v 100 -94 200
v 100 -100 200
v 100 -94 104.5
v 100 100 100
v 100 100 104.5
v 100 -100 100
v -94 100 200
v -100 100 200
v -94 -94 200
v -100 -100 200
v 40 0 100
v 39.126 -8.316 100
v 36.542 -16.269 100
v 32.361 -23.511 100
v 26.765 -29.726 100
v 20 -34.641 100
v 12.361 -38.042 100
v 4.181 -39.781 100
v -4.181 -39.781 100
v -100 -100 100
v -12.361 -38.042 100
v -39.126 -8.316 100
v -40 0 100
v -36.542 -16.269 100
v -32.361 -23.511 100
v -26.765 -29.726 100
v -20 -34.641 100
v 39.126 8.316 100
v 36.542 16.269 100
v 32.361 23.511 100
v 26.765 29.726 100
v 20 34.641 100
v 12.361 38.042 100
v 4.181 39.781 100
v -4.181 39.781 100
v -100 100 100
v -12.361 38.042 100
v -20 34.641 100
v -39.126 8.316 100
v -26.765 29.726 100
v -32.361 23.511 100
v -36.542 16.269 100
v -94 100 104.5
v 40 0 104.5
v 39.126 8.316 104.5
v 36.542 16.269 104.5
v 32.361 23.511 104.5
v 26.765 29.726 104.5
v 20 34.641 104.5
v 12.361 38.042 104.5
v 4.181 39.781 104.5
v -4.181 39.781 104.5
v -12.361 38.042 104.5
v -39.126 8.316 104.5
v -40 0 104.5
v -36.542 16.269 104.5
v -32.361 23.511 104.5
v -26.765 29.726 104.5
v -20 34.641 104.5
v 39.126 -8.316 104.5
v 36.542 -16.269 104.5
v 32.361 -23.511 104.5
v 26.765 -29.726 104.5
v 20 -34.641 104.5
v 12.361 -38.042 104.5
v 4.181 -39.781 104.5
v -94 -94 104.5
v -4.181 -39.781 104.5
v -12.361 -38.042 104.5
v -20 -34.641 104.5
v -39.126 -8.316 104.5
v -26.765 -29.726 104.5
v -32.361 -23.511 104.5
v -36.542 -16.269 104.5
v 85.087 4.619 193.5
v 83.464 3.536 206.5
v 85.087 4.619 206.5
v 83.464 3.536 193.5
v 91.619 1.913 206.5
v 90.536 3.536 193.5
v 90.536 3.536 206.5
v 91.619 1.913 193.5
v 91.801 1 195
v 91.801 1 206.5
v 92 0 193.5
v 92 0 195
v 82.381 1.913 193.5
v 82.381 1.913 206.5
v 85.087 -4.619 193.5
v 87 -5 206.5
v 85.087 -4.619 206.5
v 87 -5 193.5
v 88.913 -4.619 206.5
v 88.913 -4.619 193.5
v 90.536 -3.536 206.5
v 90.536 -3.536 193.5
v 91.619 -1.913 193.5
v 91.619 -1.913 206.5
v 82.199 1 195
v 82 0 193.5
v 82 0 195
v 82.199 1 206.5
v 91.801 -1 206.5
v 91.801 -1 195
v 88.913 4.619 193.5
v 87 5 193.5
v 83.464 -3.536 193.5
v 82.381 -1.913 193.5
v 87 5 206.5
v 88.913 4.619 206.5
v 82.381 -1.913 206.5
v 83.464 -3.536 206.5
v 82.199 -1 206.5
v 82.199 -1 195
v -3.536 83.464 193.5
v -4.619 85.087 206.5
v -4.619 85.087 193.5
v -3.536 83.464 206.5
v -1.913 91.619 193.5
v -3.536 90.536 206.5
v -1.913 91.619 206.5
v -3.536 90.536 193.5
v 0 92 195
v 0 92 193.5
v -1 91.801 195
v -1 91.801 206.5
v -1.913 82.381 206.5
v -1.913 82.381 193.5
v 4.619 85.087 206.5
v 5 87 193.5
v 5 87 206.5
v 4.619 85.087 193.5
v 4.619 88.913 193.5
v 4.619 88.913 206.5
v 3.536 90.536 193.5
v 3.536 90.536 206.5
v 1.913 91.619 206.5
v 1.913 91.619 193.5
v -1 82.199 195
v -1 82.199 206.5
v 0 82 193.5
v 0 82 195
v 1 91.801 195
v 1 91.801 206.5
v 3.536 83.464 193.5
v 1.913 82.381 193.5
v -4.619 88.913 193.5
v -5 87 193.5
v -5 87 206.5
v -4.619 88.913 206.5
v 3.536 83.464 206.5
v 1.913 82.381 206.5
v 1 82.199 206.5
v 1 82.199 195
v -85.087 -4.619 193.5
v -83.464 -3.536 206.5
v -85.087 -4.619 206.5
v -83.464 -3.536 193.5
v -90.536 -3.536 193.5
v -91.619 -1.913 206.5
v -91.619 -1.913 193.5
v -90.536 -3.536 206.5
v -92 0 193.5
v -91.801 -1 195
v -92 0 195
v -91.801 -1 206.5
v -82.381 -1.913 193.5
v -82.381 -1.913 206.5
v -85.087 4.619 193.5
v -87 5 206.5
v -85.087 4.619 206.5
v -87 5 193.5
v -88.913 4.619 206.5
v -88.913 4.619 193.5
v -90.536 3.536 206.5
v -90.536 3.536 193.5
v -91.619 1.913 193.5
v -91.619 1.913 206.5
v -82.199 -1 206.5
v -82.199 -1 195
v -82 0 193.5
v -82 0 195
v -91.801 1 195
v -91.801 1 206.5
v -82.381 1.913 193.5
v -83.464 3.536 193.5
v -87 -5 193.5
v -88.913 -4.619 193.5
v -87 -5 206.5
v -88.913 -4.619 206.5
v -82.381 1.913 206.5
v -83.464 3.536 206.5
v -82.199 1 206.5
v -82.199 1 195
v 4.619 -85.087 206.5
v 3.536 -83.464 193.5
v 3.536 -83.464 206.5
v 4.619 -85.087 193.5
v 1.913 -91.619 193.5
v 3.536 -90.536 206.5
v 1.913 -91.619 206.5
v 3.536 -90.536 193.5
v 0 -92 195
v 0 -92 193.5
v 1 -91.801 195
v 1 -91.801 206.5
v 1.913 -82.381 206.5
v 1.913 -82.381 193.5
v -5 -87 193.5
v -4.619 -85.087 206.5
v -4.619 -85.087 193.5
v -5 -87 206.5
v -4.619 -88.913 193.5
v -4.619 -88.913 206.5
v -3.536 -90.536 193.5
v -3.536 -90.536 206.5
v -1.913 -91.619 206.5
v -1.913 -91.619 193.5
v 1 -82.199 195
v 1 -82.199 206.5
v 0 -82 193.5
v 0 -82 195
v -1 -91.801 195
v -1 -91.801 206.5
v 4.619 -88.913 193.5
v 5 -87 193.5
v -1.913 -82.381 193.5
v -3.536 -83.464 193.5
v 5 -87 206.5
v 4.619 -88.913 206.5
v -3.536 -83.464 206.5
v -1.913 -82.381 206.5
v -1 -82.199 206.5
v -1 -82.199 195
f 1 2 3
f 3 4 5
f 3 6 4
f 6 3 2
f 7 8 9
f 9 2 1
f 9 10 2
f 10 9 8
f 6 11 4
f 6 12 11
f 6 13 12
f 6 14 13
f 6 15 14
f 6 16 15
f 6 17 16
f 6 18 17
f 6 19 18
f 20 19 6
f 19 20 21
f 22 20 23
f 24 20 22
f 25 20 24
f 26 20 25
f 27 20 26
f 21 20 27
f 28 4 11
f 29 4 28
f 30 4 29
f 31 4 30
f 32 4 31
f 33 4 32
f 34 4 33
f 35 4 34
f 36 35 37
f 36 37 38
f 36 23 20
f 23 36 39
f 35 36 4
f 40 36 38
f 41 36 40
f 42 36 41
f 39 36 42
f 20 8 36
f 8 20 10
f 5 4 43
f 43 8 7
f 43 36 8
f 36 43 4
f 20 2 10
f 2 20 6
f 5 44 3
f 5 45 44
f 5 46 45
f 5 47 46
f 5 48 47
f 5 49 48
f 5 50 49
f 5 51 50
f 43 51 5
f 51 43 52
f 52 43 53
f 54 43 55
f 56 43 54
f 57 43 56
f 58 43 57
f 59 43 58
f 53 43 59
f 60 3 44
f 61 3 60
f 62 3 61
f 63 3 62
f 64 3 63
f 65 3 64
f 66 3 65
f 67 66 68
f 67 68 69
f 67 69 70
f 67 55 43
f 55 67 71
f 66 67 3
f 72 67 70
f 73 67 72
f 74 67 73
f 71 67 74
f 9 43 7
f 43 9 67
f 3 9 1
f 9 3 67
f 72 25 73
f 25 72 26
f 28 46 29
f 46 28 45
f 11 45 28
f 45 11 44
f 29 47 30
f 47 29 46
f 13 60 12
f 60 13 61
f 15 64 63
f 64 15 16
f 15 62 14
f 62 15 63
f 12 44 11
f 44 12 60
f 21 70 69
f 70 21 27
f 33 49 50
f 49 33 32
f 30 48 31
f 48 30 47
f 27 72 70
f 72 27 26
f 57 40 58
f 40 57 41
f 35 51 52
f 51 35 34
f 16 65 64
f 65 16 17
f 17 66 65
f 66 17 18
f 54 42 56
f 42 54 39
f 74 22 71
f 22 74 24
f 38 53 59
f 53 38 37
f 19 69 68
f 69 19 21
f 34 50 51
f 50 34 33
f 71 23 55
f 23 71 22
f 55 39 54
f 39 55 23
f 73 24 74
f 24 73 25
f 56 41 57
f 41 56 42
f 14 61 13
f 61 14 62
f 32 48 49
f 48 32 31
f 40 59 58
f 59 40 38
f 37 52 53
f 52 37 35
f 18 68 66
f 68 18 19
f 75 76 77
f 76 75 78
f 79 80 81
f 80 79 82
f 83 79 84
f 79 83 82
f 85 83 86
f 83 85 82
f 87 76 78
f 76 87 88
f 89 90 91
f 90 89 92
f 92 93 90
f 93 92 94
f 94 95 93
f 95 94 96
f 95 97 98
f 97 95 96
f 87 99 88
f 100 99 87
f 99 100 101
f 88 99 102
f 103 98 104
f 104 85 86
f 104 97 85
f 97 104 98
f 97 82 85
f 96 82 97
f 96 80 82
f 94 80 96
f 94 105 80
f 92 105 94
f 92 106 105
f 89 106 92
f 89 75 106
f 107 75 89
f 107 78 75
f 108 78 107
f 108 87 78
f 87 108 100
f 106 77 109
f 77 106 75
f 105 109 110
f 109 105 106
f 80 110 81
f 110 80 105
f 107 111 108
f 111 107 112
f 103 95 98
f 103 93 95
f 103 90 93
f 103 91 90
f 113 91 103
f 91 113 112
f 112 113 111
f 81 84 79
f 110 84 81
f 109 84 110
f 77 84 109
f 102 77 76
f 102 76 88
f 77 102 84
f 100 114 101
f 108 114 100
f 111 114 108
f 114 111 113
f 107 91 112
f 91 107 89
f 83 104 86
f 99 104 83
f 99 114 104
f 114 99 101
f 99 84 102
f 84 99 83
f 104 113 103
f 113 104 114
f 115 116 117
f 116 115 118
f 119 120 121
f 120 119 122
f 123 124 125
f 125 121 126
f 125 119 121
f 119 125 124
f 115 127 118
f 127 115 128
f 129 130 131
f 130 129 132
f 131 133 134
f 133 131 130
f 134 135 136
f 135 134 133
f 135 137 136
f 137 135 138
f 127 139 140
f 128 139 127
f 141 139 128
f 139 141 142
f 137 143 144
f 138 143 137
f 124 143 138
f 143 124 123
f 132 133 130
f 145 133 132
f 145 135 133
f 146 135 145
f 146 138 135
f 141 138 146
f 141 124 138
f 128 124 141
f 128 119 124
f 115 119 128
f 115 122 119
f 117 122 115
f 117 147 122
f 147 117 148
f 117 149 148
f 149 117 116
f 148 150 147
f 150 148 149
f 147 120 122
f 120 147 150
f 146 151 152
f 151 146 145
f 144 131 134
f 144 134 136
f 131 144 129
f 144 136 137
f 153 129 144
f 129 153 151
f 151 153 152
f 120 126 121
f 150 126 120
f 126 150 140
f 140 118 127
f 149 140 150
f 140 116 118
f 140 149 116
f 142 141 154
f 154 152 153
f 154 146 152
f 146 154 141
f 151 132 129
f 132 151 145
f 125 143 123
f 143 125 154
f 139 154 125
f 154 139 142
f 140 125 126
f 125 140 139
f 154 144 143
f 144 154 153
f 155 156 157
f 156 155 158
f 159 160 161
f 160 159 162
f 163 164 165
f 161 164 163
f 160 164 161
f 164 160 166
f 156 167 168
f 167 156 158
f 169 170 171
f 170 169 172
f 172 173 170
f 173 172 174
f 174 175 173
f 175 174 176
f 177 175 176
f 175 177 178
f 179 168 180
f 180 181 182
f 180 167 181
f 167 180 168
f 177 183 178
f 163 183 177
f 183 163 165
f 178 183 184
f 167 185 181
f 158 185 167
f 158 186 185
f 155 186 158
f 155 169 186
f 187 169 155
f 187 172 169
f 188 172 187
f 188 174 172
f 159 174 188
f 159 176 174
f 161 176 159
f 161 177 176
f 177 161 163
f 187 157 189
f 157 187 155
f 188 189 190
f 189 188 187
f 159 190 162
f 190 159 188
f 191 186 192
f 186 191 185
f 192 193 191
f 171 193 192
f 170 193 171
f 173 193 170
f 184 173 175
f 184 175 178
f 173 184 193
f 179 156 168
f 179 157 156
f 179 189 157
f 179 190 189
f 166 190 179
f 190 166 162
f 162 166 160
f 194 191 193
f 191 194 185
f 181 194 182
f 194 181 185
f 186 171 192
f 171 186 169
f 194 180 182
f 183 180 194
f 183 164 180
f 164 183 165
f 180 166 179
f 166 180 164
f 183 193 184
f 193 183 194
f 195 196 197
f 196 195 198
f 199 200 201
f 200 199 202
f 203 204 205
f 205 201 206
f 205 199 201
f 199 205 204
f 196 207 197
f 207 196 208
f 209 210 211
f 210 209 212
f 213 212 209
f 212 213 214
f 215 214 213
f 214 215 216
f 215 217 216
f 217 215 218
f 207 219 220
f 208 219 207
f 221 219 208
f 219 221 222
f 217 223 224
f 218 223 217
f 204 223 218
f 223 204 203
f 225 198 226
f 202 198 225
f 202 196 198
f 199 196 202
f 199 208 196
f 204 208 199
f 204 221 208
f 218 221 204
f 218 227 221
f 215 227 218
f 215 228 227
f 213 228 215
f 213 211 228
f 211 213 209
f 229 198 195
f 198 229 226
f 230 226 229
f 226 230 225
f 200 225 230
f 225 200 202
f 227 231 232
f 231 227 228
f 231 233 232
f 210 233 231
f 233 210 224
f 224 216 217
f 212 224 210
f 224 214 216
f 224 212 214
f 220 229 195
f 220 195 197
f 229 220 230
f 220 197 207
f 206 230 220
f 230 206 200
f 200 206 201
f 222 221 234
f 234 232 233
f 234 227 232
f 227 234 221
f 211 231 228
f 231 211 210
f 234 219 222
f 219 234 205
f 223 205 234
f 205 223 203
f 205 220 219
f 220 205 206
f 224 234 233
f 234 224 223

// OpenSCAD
// Kelly Kettle Air Box Attachment for Air-Frying, Broiling, and Steaming
// Parameters for customization
flue_diameter = 80;    // Diameter of the Kelly Kettle flue opening (mm)
flue_height = 150;     // Height of the Kelly Kettle flue that the attachment fits over (mm)
air_box_width = 200;   // Width of the Air Box (mm)
air_box_height = 100;  // Height of the Air Box (mm)
steam_spout_diameter = 20; // Diameter of the steam spout opening (mm)
vent_diameter = 10;    // Diameter of adjustable vents for temperature control (mm)
wall_thickness = 3;    // Thickness of the Air Box walls (mm)

// Main function
module air_box_attachment() {
    // Outer shell of the Air Box
    difference() {
        // Main air box volume
        translate([0, 0, flue_height])
        cube([air_box_width, air_box_width, air_box_height], true);

        // Hollowing the box
        translate([wall_thickness, wall_thickness, flue_height + wall_thickness])
        cube([air_box_width - 2 * wall_thickness, air_box_width - 2 * wall_thickness, air_box_height - wall_thickness], true);

        // Flue opening
        translate([0, 0, flue_height / 2])
        cylinder(r=flue_diameter / 2, h=air_box_height + flue_height, center=true);

        // Steam spout opening
        translate([air_box_width / 4, 0, flue_height + air_box_height / 2])
        cylinder(r=steam_spout_diameter / 2, h=wall_thickness + 1, center=true);
    }

    // Adjustable vents on the sides
    for (i = [0:90:270]) {
        rotate([0, 0, i])
        translate([air_box_width / 2 - wall_thickness - vent_diameter, 0, flue_height + air_box_height / 2])
        vent_control();
    }
}

// Module for the adjustable vent control
module vent_control() {
    // Base vent hole
    difference() {
        cylinder(r=vent_diameter / 2, h=wall_thickness + 10, center=true);

        // Vent slider (slot for adjustment)
        translate([-vent_diameter / 2, -1, -5])
        cube([vent_diameter, 2, 20]);
    }
}

// Main program call
air_box_attachment();
